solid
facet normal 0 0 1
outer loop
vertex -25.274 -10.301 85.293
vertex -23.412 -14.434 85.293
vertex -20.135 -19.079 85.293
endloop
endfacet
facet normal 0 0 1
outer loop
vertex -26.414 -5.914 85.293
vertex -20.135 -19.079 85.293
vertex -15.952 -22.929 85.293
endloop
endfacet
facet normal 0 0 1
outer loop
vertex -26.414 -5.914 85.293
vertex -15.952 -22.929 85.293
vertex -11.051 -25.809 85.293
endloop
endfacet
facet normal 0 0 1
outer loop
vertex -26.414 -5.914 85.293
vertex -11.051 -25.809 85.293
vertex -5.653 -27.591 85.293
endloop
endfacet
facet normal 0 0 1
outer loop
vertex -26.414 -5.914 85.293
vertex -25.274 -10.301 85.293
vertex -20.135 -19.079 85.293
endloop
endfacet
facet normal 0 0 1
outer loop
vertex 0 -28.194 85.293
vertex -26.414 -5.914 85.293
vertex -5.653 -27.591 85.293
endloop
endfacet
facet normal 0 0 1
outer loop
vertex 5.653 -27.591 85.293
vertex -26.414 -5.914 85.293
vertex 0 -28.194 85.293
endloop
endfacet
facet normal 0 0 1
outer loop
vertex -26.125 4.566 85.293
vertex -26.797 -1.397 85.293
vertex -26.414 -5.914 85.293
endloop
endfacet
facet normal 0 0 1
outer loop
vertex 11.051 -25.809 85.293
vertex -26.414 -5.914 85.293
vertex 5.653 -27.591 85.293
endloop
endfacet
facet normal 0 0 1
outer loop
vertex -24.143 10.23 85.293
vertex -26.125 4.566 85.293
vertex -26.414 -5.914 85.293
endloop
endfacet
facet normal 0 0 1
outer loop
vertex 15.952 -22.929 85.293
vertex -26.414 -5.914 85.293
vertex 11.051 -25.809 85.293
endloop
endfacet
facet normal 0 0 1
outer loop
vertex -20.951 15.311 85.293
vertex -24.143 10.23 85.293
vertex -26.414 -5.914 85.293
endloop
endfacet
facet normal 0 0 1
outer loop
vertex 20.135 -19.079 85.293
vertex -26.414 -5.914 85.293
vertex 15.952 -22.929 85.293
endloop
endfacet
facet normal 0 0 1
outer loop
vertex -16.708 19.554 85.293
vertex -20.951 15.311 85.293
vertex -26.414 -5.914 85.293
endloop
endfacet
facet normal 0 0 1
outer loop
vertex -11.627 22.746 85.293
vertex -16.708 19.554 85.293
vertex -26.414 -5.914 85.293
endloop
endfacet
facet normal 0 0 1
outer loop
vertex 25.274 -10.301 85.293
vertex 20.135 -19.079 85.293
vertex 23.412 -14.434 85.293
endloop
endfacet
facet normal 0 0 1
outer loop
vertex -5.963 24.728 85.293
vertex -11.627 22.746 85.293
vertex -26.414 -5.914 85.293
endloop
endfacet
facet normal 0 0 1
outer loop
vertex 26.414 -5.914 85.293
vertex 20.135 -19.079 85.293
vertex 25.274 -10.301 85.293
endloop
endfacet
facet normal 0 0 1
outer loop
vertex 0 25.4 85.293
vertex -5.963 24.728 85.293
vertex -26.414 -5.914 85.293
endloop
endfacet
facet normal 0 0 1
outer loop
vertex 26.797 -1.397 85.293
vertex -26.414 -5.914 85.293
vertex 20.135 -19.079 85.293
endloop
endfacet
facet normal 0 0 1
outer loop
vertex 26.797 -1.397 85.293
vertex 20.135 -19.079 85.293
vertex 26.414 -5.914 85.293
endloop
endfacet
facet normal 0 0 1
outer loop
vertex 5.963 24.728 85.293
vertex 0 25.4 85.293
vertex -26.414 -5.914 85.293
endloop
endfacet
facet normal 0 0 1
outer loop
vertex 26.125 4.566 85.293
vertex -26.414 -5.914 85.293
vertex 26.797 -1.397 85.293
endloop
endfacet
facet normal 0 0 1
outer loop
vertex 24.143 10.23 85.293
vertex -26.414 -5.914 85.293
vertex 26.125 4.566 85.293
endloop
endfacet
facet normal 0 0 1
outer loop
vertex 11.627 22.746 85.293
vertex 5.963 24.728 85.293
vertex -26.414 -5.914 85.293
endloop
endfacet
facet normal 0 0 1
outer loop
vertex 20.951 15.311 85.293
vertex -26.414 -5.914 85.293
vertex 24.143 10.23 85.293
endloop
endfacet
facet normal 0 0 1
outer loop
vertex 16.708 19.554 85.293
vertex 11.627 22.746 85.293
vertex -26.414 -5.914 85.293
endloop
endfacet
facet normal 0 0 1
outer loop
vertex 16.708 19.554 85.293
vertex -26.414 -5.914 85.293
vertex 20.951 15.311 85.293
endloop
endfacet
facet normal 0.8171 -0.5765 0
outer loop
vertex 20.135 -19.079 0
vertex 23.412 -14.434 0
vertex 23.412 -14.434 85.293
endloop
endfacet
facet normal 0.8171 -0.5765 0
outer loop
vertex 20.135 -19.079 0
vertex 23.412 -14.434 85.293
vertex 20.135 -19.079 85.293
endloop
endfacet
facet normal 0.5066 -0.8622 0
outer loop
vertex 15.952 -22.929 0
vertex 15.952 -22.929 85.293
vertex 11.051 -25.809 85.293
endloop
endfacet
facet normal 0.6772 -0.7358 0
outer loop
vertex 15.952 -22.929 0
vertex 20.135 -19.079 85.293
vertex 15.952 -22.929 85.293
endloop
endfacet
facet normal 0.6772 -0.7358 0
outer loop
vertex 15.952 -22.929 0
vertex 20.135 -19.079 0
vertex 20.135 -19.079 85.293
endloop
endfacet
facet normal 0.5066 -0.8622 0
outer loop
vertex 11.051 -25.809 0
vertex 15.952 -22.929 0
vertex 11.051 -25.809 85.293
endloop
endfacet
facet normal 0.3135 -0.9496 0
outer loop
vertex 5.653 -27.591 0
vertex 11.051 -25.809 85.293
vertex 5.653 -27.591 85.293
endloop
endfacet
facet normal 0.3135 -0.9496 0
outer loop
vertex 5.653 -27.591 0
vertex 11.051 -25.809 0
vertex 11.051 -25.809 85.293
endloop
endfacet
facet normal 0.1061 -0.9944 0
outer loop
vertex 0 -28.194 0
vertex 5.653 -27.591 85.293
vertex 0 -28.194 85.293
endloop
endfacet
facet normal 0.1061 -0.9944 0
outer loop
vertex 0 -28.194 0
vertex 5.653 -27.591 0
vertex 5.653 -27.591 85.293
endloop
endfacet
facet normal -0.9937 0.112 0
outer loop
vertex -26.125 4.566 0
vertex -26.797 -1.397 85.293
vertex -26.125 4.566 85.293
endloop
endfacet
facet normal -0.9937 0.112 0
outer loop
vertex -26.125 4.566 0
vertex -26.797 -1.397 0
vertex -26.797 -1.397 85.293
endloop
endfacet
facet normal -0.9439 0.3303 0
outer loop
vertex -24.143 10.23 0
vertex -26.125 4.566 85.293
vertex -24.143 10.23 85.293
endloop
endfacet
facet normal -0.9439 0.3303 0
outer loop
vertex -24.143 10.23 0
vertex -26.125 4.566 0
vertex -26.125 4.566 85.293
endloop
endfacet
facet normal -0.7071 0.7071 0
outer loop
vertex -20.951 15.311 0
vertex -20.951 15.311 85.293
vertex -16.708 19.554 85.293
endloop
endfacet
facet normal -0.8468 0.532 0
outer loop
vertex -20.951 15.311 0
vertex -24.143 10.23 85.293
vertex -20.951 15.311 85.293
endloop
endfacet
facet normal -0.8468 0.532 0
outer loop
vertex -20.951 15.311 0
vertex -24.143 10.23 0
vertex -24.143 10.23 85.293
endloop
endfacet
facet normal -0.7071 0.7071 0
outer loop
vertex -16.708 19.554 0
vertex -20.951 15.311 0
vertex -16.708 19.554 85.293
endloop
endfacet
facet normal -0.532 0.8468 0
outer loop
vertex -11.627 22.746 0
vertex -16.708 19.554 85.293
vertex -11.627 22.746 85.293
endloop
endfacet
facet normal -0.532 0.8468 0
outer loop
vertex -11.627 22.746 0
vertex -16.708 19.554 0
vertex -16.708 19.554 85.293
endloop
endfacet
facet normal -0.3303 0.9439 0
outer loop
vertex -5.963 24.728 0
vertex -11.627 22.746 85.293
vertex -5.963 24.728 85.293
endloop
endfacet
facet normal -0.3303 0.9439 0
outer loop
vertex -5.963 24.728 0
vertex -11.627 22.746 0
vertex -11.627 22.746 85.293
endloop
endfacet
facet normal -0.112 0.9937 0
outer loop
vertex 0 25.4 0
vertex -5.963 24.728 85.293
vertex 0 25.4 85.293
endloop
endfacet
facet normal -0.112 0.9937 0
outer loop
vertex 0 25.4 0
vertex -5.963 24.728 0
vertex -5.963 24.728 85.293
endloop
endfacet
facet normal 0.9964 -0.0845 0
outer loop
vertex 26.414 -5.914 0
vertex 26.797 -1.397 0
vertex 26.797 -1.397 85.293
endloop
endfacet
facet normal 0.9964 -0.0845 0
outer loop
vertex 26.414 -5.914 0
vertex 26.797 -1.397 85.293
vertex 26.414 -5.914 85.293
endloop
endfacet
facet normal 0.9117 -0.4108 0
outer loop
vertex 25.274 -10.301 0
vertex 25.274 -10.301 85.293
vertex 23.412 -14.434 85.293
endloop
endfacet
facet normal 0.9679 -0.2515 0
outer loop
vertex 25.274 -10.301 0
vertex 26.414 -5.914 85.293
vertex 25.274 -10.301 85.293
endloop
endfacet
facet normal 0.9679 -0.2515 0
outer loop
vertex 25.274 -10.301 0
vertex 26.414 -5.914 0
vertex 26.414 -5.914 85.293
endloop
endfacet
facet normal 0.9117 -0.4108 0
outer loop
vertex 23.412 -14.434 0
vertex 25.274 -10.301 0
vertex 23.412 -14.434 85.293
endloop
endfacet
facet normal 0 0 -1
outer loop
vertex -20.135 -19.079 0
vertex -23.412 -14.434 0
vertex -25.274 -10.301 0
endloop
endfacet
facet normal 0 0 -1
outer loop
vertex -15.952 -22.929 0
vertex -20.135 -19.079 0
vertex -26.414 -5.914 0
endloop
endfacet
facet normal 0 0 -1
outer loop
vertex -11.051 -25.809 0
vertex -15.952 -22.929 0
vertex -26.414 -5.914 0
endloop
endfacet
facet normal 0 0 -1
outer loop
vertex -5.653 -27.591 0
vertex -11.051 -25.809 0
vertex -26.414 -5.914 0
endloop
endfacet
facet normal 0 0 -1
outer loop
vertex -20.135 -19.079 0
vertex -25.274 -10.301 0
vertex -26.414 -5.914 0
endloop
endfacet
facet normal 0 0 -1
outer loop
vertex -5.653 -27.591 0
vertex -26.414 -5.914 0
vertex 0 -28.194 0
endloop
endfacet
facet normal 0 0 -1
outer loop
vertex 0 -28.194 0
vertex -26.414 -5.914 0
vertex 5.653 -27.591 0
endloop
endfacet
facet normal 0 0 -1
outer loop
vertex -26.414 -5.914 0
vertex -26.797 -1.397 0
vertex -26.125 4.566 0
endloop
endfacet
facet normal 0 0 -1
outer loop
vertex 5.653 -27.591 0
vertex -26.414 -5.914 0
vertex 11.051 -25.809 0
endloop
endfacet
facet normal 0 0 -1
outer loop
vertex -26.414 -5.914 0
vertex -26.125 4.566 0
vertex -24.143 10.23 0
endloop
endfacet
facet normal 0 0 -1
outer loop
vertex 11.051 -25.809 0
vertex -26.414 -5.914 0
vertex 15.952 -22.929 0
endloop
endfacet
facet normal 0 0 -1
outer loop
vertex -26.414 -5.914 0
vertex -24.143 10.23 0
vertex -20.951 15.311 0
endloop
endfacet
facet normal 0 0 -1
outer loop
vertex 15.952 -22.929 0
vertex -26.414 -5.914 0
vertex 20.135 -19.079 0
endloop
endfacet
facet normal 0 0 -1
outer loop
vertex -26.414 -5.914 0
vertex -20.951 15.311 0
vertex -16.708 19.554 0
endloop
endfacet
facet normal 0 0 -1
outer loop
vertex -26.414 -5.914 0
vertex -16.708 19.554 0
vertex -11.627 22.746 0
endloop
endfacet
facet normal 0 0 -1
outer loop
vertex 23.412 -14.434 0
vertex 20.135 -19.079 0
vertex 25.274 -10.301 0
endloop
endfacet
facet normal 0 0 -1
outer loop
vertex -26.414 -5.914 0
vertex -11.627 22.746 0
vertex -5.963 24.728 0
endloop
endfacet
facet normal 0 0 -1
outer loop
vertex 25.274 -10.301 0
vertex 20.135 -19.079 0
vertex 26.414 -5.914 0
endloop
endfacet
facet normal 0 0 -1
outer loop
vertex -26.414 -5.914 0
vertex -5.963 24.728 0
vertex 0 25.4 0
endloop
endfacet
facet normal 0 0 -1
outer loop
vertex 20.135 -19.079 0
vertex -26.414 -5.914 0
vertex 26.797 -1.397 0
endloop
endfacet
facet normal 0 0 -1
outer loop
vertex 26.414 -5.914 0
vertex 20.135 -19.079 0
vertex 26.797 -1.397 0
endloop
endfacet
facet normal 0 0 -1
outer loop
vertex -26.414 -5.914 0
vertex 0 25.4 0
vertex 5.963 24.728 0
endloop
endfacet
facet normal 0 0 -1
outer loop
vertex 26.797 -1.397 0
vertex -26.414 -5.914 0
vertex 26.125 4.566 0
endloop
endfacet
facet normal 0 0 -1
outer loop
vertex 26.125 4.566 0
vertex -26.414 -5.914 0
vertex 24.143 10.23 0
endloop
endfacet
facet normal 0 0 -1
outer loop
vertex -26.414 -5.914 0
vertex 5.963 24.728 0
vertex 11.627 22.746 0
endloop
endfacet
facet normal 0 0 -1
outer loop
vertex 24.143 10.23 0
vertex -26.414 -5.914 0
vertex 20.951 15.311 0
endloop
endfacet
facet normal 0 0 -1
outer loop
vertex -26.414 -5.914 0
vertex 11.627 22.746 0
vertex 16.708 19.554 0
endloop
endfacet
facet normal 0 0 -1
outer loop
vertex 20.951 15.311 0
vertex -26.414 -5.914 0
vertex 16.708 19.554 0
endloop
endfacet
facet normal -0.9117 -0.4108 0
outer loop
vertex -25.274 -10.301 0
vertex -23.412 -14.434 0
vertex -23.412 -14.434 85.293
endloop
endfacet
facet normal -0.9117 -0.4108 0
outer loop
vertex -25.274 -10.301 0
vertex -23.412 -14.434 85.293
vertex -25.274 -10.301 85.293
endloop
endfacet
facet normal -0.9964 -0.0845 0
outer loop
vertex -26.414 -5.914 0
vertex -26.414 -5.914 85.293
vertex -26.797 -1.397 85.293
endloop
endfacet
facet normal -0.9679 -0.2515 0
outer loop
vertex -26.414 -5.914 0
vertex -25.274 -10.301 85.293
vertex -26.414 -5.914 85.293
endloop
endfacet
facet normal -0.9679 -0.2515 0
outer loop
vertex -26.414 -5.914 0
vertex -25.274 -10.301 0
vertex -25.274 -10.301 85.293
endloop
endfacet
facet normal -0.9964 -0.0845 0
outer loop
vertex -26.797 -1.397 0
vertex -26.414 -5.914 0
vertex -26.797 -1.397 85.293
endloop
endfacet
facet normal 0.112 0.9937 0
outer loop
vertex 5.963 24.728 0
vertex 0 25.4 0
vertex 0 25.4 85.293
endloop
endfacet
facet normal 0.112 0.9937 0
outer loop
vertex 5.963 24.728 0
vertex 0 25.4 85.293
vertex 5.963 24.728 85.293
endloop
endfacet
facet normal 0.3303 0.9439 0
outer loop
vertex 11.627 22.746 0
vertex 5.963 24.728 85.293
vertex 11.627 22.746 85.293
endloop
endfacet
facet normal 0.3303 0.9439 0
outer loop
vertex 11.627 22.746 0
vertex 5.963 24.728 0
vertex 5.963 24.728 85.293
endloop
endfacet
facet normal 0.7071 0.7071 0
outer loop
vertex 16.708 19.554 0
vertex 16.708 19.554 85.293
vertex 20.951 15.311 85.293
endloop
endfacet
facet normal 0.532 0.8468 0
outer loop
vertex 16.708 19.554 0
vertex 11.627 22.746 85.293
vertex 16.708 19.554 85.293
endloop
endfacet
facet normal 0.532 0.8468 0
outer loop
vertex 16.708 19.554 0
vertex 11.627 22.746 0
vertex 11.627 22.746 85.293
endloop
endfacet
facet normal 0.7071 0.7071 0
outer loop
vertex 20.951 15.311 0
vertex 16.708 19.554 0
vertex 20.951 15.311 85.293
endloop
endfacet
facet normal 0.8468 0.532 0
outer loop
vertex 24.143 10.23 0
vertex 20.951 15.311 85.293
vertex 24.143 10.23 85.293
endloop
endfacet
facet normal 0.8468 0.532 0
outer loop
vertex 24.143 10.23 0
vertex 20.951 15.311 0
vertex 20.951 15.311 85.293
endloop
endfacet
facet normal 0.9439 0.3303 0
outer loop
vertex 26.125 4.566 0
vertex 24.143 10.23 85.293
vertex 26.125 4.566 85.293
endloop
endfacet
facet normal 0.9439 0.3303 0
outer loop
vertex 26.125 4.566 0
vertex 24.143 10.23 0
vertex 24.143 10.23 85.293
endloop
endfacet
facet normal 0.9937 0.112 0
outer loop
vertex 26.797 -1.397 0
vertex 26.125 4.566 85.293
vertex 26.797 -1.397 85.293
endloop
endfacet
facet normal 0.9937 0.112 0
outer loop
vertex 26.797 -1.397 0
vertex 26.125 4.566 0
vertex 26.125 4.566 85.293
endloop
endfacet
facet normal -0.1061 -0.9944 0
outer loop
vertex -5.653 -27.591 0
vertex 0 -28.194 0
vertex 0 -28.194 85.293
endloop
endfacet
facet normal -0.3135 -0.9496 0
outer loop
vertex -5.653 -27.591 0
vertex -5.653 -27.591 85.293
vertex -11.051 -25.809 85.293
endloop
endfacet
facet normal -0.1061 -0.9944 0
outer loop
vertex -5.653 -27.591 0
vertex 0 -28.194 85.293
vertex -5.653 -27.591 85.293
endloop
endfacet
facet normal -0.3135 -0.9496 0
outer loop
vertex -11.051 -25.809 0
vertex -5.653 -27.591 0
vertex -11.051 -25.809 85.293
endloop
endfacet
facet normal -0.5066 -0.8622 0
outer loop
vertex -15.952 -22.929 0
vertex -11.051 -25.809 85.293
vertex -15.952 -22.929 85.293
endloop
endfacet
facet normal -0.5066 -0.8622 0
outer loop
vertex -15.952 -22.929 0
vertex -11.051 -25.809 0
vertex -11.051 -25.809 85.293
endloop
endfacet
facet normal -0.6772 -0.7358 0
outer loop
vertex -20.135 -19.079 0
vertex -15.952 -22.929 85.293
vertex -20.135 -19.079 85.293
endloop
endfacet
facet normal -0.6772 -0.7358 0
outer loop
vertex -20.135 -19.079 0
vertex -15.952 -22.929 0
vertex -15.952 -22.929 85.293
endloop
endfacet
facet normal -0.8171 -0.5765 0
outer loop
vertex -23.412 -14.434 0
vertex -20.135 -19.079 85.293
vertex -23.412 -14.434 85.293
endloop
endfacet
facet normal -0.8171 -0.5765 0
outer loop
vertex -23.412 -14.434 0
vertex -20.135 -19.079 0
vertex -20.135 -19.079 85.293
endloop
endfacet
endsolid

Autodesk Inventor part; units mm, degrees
ref_plane "YZ Plane" through (0, 0, 0) normal (1, 0, 0) x (0, 1, 0)
ref_plane "XZ Plane" through (0, 0, 0) normal (0, 1, 0) x (-1, 0, 0)
ref_plane "Work Plane1" through (-26.797, -37.3063, 85.979) normal (0, 0, -1) x (0, 1, 0)
sketch "Sketch1" plane through (0, 0, 0) normal (0, 0, 1) x (1, 0, 0)
  arc A0 (-23.9286, -16.5336) -> (-20.447, -28.194) centre (-20.447, -21.844) ccw projected
  line L0 (-20.447, -28.194) -> (20.447, -28.194) projected
  arc A1 (20.447, -28.194) -> (23.9286, -16.5336) centre (20.447, -21.844) ccw projected
  arc A2 (23.4121, -14.4336) -> (23.9286, -16.5336) centre (24.799, -15.206) ccw projected
  arc A3 (23.4121, -14.4336) -> (26.797, -1.397) centre (0, -1.397) ccw projected
  line L1 (26.797, -1.397) -> (26.797, 19.05) projected
  arc A4 (26.797, 19.05) -> (20.447, 25.4) centre (20.447, 19.05) ccw projected
  line L2 (20.447, 25.4) -> (-20.447, 25.4) projected
  arc A5 (-20.447, 25.4) -> (-26.797, 19.05) centre (-20.447, 19.05) ccw projected
  line L3 (-26.797, 19.05) -> (-26.797, -1.397) projected
  arc A6 (-26.797, -1.397) -> (-23.4121, -14.4336) centre (0, -1.397) ccw projected
  arc A7 (-23.9286, -16.5336) -> (-23.4121, -14.4336) centre (-24.799, -15.206) ccw projected
  circle A8 centre (0, -1.397) radius 26.797
  point P0 (0, 0)
  dimension "d0" = 53.594
extrude "Extrusion1" add sketch "Sketch1" along normal blind 85.2932 contours A6 A8 A3
properties part number "Pneumatics_VIAIR_00090_03"
